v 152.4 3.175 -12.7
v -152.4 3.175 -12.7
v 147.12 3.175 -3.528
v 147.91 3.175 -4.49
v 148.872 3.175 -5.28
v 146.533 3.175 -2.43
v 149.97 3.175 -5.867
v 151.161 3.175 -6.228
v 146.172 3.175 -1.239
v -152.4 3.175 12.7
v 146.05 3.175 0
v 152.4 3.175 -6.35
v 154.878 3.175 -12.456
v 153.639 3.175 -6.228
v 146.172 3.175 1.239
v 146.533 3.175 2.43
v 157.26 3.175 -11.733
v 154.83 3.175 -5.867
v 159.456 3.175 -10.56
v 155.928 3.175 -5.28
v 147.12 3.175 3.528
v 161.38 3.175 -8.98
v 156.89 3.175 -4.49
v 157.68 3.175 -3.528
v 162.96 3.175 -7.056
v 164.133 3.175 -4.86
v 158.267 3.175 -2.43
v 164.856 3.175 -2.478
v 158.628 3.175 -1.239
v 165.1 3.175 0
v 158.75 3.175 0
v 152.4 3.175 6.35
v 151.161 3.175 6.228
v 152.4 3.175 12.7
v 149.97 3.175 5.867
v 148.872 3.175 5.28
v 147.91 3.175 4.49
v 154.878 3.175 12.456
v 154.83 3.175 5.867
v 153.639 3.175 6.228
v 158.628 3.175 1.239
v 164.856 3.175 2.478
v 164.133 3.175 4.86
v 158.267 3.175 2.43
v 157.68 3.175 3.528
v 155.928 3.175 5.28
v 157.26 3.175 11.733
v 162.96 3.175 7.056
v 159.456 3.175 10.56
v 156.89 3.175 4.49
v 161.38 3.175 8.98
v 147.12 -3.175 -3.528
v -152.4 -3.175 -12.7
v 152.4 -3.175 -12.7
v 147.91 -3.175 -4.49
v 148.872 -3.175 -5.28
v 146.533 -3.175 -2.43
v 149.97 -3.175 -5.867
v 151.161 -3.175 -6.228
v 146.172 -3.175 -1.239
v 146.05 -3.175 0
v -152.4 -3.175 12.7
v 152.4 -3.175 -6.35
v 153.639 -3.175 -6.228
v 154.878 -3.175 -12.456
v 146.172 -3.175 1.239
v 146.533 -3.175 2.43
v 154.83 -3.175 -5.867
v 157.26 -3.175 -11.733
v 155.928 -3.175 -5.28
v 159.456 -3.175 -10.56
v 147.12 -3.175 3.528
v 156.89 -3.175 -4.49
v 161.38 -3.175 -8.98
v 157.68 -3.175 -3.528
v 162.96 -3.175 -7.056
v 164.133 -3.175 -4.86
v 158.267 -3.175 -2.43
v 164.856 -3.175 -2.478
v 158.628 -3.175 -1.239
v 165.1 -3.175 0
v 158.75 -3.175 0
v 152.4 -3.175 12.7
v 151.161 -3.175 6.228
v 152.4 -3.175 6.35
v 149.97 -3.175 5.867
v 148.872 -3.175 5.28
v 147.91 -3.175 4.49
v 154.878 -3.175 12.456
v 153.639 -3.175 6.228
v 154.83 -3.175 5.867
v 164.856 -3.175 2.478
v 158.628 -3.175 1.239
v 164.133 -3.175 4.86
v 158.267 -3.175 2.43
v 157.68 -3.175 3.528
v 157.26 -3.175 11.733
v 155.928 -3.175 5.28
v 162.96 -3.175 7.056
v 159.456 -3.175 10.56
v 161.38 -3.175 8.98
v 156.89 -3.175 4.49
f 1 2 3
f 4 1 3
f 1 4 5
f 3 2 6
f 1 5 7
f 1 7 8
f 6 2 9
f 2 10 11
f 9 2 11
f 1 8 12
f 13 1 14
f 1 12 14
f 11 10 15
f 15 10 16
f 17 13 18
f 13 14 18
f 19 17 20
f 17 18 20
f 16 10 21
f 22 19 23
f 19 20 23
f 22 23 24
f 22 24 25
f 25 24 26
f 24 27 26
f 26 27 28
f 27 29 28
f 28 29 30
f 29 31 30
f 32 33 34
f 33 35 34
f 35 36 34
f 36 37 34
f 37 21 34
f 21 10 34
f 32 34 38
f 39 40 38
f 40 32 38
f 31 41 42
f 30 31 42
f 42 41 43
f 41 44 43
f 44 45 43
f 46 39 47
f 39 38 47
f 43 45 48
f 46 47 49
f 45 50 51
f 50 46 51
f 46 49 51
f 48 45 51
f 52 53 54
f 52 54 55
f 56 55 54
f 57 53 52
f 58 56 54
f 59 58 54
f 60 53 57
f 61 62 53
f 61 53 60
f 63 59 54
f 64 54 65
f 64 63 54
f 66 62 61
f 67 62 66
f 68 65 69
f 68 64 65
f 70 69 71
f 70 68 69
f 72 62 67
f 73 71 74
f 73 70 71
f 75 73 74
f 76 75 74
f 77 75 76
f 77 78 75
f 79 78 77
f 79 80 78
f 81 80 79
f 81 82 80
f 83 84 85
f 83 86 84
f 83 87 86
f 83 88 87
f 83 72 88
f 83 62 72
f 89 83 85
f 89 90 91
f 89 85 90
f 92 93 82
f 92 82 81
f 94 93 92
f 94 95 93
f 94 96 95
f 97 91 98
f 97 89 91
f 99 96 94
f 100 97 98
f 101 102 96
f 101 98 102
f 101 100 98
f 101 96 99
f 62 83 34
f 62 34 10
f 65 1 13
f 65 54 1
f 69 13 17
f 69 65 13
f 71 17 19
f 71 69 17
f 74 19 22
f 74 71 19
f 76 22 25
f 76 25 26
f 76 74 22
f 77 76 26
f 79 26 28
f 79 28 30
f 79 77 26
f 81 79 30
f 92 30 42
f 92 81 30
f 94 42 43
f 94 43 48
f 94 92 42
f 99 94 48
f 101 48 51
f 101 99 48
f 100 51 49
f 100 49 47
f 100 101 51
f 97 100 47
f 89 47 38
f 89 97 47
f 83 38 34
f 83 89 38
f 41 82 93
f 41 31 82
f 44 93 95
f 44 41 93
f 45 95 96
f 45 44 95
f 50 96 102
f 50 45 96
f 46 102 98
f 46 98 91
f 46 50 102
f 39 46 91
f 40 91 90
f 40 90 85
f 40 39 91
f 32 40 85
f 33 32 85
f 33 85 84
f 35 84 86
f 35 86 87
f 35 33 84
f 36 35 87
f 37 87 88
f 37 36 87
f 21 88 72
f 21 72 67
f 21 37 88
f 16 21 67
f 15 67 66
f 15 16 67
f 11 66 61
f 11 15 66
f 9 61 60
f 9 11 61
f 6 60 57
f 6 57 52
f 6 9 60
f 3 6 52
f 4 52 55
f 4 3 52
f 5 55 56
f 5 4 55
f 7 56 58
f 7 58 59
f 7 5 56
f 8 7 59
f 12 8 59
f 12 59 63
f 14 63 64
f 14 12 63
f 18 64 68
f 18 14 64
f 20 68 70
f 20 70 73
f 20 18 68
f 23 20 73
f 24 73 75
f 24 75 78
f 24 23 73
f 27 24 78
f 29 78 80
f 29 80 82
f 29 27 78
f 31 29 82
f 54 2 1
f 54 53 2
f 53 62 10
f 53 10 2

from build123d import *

# Parameters (mm, degrees)
F0_R     = 6.35
F1_DEPTH = 3.175


with BuildPart() as f1:
    # F0 (on Front) → F1 (new body, symmetric)
    with BuildSketch(Plane.XZ):
        with BuildLine():
            ThreePointArc((152.4, -12.7), (165.1, 0), (152.4, 12.7))
            Line((152.4, 12.7), (-152.4, 12.7))
            Line((-152.4, 12.7), (-152.4, -12.7))
            Line((-152.4, -12.7), (152.4, -12.7))
        make_face()
        with Locations((152.4, 0)):
            Circle(F0_R, mode=Mode.SUBTRACT)
    extrude(amount=F1_DEPTH, both=True)


solid = f1.part
